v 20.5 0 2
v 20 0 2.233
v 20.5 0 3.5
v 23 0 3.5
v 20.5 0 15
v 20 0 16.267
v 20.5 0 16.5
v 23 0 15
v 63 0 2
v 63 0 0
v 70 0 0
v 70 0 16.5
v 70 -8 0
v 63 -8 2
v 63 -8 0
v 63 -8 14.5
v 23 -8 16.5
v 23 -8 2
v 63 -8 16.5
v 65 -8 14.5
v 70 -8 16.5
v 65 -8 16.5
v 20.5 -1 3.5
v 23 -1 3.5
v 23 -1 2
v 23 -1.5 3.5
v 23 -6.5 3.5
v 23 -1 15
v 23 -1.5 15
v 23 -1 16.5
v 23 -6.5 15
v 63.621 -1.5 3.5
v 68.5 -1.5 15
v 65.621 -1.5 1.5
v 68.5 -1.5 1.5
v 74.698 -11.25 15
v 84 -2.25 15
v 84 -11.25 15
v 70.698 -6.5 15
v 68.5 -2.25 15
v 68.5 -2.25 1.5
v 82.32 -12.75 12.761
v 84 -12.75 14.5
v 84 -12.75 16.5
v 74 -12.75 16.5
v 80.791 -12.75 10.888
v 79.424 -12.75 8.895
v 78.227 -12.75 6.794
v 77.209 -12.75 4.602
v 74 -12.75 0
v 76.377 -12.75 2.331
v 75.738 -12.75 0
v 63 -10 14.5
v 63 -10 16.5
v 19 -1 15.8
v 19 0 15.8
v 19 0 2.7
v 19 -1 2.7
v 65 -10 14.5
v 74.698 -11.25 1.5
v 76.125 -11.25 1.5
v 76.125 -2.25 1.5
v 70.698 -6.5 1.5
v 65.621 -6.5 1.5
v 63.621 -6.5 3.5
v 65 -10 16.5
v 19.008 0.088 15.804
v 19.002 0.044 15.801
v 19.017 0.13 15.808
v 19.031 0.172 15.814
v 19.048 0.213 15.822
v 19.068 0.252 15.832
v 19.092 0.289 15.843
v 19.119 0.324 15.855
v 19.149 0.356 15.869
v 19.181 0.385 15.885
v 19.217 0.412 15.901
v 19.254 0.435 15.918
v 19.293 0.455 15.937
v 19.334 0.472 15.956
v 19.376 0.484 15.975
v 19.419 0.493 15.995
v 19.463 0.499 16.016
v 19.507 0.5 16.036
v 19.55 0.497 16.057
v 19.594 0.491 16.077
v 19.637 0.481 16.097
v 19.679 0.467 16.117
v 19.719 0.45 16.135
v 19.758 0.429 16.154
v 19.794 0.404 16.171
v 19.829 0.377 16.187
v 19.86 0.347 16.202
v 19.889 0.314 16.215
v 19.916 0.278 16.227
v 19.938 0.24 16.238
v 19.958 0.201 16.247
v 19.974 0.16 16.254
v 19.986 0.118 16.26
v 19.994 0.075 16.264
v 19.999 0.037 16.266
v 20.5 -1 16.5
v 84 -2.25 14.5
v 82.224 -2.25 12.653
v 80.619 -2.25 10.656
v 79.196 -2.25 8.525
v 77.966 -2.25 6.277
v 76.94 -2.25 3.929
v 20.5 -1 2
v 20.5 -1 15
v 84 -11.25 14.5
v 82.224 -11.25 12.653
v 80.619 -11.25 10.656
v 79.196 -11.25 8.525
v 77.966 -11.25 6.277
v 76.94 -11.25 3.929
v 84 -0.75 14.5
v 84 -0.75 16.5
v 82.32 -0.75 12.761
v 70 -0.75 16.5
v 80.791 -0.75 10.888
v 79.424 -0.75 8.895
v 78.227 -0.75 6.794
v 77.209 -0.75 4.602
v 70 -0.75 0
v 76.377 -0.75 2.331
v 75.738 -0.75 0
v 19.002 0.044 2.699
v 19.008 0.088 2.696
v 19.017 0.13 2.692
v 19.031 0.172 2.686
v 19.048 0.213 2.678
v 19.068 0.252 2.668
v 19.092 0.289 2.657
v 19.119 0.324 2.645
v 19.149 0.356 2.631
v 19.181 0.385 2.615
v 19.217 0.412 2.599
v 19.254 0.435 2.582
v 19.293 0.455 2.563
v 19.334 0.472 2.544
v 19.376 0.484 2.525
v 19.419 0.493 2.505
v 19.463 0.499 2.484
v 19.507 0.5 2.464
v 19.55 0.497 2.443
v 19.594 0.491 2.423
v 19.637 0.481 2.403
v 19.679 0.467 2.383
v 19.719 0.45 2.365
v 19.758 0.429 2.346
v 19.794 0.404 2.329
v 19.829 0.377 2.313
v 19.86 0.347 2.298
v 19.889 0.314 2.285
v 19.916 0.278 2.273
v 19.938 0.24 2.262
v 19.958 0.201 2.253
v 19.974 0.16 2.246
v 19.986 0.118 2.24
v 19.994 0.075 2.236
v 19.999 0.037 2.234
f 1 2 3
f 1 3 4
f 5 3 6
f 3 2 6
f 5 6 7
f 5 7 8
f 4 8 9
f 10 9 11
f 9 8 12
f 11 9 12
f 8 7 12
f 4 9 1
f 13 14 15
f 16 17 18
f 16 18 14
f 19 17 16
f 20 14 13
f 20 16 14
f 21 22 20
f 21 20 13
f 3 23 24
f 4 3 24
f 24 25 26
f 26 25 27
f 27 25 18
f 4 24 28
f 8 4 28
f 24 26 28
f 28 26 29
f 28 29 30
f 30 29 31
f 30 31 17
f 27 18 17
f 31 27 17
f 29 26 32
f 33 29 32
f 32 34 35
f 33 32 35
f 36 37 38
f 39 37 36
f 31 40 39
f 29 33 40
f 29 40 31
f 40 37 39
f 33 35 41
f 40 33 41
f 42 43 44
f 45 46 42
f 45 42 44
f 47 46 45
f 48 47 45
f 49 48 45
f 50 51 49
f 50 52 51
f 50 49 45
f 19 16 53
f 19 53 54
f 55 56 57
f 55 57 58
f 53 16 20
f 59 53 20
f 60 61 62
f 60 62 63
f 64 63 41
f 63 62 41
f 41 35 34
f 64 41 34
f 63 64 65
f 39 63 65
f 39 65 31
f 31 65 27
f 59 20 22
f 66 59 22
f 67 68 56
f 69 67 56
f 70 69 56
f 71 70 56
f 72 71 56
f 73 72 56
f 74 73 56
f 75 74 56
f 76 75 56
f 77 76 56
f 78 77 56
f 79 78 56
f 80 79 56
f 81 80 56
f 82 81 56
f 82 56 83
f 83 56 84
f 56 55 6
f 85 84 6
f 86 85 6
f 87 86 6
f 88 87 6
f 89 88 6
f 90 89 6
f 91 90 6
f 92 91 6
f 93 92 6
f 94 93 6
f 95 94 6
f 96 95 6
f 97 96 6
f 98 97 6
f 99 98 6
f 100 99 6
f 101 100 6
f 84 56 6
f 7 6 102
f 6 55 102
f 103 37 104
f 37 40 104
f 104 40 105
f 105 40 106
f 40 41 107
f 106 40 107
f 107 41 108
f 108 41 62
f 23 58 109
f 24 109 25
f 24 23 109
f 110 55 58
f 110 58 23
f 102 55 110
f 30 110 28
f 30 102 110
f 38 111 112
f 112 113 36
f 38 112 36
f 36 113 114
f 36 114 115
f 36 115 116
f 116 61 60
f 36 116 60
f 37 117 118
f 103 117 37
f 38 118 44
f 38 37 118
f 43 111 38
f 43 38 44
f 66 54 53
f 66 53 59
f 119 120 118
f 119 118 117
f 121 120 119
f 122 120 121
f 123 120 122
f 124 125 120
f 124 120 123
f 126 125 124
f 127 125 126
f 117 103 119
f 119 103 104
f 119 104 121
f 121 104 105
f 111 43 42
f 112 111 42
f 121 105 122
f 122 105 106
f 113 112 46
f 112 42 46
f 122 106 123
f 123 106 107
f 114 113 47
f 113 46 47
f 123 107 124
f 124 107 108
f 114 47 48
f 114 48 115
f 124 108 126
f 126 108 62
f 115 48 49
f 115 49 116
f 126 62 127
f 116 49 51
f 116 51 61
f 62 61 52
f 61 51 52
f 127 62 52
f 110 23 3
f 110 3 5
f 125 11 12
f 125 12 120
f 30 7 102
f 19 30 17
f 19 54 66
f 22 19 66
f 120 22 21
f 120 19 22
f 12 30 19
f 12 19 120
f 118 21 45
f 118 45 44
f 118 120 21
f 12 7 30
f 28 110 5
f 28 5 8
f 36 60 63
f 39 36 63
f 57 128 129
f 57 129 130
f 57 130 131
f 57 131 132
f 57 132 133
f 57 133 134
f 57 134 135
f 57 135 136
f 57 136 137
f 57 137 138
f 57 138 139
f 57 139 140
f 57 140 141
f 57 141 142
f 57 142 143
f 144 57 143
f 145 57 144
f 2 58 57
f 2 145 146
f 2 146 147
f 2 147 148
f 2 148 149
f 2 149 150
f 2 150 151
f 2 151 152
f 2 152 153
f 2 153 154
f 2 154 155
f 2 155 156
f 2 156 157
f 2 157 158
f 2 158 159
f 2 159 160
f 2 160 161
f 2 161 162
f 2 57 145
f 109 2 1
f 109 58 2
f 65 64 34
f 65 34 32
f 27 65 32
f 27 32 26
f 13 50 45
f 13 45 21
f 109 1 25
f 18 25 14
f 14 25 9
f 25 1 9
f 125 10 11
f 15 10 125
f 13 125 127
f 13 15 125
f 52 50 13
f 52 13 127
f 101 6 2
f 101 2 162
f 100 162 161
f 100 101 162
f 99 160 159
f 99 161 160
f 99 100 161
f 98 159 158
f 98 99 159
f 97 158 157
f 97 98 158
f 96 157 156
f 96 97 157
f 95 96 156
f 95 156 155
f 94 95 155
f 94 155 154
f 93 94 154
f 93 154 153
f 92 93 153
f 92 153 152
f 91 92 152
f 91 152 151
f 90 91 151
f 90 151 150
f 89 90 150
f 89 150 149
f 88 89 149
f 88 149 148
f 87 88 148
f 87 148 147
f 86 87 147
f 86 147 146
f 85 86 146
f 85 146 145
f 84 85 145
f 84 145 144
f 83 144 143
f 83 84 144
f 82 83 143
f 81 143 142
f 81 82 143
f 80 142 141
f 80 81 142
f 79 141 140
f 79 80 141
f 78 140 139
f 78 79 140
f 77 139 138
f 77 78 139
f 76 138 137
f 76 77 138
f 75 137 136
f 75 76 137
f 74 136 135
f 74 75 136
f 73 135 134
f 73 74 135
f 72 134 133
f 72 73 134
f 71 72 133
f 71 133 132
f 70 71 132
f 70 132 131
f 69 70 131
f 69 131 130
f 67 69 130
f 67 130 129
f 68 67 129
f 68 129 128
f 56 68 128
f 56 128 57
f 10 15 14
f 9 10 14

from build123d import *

# Parameters (mm, degrees)
RESSALTO_EXTRUS_O1_DEPTH   = 16.5
CORTE_EXTRUS_O3_DEPTH      = 1
CORTE_EXTRUS_O3_DEPTH_BACK = 13.75
CASCA1_T                   = -1.5
CORTE_EXTRUS_O2_DEPTH      = 13.75
ESBO_O6_W                  = 60.936281692
ESBO_O6_H                  = 31.71485299
CORTE_EXTRUS_O4_DEPTH      = 3
CORTE_EXTRUS_O4_DEPTH_BACK = 15.5
RESSALTO_EXTRUS_O2_DEPTH   = 14.5
ESBO_O8_W                  = 2.5
ESBO_O8_H                  = 11.5
CORTE_EXTRUS_O5_DEPTH      = 10
ESBO_O9_W                  = 2
ESBO_O9_H                  = 2
RESSALTO_EXTRUS_O3_DEPTH   = 2
ESBO_O10_W                 = 2
ESBO_O10_H                 = 2
RESSALTO_EXTRUS_O4_DEPTH   = 8


with BuildPart() as part:
    # Esboço1 → Ressalto-extrusão1 (new body)
    with BuildSketch(Plane.XY):
        with BuildLine():
            Line((9.53089658, 0), (70, 0))
            Line((70, 0), (70, -0.75))
            Line((70, -0.75), (84, -0.75))
            Line((84, -0.75), (84, -12.75))
            Line((84, -12.75), (74, -12.75))
            Line((74, -12.75), (70, -8))
            Line((70, -8), (6.002125959, -8))
            Line((6.002125959, -8), (5.638155725, -9))
            Line((5.638155725, -9), (0, -6.94787914))
            Line((0, -6.94787914), (0.133970372, -6.579798567))
            ThreePointArc((0.133970372, -6.579798567), (3.795132217, -1.808479557), (9.53089658, 0))
        make_face()
    extrude(amount=RESSALTO_EXTRUS_O1_DEPTH)

    # Esboço5 → Corte-extrusão3 (cut, two sides)
    with BuildSketch(Plane.XZ.offset(12.75)) as corte_extrus_o3_sk:
        Polygon((0, 0), (65, 0), (63, 2), (0, 2), align=None)
    extrude(amount=CORTE_EXTRUS_O3_DEPTH, mode=Mode.SUBTRACT)
    extrude(corte_extrus_o3_sk.sketch, amount=-CORTE_EXTRUS_O3_DEPTH_BACK, mode=Mode.SUBTRACT)

    # Casca1
    casca1_openings = [part.faces().sort_by_distance(p)[0] for p in [
        (84, -6.75, 8.25),
        (2.819077862, -7.97393957, 9.25),
    ]]
    offset(amount=CASCA1_T, openings=casca1_openings, kind=Kind.INTERSECTION)

    # Esboço4 → Corte-extrusão2 (cut, through all)
    with BuildSketch(Plane.XZ.offset(12.75)):
        with BuildLine():
            Line((75.737834478, 0), (84, 0))
            Line((84, 0), (84, 14.5))
            ThreePointArc((84, 14.5), (78.803340396, 7.8571705), (75.737834478, 0))
        make_face()
    extrude(amount=-CORTE_EXTRUS_O2_DEPTH, mode=Mode.SUBTRACT)

    # Esboço6 → Corte-extrusão4 (cut, two sides)
    with BuildSketch(Plane(origin=(0, 0, 2), x_dir=(-1, 0, 0), z_dir=(0, 0, -1))) as corte_extrus_o4_sk:
        with Locations((7.468140846, -5.914756455)):
            Rectangle(ESBO_O6_W, ESBO_O6_H)
    extrude(amount=CORTE_EXTRUS_O4_DEPTH, mode=Mode.SUBTRACT)
    extrude(corte_extrus_o4_sk.sketch, amount=-CORTE_EXTRUS_O4_DEPTH_BACK, mode=Mode.SUBTRACT)

    # Esboço7 → Ressalto-extrusão2 (add)
    with BuildSketch(Plane.XY.offset(16.5)):
        with BuildLine():
            Line((23, 0), (20, 0))
            ThreePointArc((20, 0), (19.5, 0.5), (19, 0))
            Line((19, 0), (19, -1))
            Line((19, -1), (23, -1))
            Line((23, -1), (23, 0))
        make_face()
    extrude(amount=-RESSALTO_EXTRUS_O2_DEPTH)

    # Esboço8 → Corte-extrusão5 (cut)
    with BuildSketch(Plane.XZ.offset(1)):
        with Locations((21.75, 9.25)):
            Rectangle(ESBO_O8_W, ESBO_O8_H)
        Polygon((20.5, 16.5), (19, 16.5), (19, 15.8), align=None)
        Polygon((19, 2.7), (20.5, 2), (19, 2), align=None)
    extrude(amount=-CORTE_EXTRUS_O5_DEPTH, mode=Mode.SUBTRACT)

    # Esboço9 → Ressalto-extrusão3 (add)
    with BuildSketch(Plane.XZ.offset(8)):
        with Locations((64, 15.5)):
            Rectangle(ESBO_O9_W, ESBO_O9_H)
    extrude(amount=RESSALTO_EXTRUS_O3_DEPTH)

    # Esboço10 → Ressalto-extrusão4 (add)
    with BuildSketch(Plane.XZ.offset(8)):
        with Locations((64, 1)):
            Rectangle(ESBO_O10_W, ESBO_O10_H)
    extrude(amount=-RESSALTO_EXTRUS_O4_DEPTH)


solid = part.part
